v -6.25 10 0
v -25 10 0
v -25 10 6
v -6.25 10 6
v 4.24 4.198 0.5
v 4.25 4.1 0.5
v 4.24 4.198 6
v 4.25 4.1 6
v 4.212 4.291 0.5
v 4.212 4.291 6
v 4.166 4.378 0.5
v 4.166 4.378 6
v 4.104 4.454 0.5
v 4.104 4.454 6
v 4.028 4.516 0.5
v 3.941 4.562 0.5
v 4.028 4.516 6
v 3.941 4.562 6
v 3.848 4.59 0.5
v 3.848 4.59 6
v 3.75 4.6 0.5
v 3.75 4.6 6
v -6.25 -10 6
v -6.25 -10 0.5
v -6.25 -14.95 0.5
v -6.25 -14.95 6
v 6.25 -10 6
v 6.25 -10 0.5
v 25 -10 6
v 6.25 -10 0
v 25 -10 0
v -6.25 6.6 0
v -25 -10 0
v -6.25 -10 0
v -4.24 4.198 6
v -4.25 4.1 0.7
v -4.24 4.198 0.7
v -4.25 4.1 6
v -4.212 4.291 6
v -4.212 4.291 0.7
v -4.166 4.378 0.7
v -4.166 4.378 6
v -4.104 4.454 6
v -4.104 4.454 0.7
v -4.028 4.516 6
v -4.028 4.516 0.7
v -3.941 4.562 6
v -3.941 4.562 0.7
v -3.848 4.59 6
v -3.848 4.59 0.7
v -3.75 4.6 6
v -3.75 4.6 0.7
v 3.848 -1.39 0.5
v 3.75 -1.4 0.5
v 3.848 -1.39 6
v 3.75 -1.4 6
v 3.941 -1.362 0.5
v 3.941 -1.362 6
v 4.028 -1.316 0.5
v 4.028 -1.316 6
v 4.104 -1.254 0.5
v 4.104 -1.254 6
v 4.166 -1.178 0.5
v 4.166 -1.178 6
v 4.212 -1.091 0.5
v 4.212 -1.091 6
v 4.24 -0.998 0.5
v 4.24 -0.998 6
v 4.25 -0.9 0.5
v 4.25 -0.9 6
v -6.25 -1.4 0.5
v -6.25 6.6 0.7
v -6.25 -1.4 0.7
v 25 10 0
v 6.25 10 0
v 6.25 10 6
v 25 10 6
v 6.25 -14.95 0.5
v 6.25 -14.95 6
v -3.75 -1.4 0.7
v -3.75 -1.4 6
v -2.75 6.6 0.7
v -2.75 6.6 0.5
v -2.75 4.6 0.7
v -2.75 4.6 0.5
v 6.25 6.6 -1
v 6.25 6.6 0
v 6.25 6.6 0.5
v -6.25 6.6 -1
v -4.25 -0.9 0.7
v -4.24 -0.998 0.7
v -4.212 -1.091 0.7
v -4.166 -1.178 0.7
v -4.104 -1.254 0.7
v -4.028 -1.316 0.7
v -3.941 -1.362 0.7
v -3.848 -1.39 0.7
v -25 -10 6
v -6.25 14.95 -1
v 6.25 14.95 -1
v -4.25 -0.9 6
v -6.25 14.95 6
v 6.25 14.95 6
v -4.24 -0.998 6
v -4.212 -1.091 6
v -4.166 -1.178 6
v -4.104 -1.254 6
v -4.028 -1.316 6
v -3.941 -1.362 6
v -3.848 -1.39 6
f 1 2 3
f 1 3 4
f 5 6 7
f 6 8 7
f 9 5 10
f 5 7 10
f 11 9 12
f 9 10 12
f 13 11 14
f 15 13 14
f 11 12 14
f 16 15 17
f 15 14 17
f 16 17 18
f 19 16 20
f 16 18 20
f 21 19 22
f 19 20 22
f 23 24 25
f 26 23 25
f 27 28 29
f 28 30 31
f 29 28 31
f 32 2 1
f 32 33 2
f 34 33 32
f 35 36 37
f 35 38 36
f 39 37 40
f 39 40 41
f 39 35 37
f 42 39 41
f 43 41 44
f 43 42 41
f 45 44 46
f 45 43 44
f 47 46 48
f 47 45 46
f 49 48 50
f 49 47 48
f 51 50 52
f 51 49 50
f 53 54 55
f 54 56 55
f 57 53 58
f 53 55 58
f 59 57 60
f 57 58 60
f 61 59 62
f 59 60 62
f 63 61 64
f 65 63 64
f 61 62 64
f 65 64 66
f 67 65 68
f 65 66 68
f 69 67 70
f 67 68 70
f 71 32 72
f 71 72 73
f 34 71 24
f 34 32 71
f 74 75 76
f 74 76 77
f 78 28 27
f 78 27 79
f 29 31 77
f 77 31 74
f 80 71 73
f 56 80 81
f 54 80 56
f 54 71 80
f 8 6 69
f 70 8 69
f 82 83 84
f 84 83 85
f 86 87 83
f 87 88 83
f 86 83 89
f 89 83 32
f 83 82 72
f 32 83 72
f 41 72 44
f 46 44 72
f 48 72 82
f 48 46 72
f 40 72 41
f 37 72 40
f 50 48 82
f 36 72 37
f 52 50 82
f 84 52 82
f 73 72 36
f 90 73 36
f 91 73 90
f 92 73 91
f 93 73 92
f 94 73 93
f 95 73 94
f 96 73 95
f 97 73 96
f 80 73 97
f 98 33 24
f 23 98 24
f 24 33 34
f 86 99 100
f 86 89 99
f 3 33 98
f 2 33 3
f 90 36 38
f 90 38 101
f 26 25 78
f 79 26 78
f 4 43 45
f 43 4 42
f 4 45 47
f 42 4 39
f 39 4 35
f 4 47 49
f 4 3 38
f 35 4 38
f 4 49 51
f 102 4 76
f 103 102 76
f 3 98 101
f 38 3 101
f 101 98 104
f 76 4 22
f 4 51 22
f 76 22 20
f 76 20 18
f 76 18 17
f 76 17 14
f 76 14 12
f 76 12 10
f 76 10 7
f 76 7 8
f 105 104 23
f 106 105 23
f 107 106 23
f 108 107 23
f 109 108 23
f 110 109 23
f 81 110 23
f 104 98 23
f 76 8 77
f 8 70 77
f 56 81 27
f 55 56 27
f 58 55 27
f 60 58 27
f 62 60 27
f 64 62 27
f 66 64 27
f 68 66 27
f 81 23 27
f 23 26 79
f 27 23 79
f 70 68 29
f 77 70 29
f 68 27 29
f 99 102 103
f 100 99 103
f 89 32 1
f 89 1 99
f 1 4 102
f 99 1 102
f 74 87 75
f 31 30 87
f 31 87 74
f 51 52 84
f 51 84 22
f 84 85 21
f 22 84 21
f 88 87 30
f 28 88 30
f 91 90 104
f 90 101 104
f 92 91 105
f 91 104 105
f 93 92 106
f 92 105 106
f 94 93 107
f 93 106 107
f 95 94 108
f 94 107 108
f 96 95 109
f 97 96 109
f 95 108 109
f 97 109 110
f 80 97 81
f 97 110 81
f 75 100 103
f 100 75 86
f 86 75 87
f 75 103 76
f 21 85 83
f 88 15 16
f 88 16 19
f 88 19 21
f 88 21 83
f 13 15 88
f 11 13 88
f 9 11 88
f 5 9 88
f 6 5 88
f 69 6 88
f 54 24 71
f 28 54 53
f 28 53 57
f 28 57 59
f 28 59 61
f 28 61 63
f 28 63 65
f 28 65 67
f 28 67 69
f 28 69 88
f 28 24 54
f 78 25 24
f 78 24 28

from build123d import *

# Parameters (mm, degrees)
F0_W      = 50
F0_H      = 20
F1_DEPTH  = 6
F2_W      = 12.5
F2_H      = 29.9
F3_DEPTH  = 6
F5_W      = 12.5
F5_H      = 21.55
F6_DEPTH  = 0.5
F8_W      = 3.5
F8_H      = 8
F9_DEPTH  = 0.2
F11_DEPTH = 1
F12_W     = 8.5
F12_H     = 6
F13_DEPTH = 25
F14_R     = 0.5


with BuildPart() as f1:
    # F0 (on Top) → F1 (new body)
    with BuildSketch(Plane.XY):
        Rectangle(F0_W, F0_H)
    extrude(amount=F1_DEPTH)

    # F2 (on face) → F3 (join)
    with BuildSketch(Plane(origin=(0, 0, 0), x_dir=(1, 0, 0), z_dir=(0, 0, -1))):
        Rectangle(F2_W, F2_H)
    extrude(amount=-F3_DEPTH)

    # F5 (on face) → F6 (cut)
    with BuildSketch(Plane(origin=(0, 0, 0), x_dir=(1, 0, 0), z_dir=(0, 0, -1))):
        with Locations((0, 4.175)):
            Rectangle(F5_W, F5_H)
    extrude(amount=-F6_DEPTH, mode=Mode.SUBTRACT)

    # F8 (on face) → F9 (cut)
    with BuildSketch(Plane(origin=(0, 0, 0.5), x_dir=(1, 0, 0), z_dir=(0, 0, -1))):
        with Locations((-4.5, -2.6)):
            Rectangle(F8_W, F8_H)
    extrude(amount=-F9_DEPTH, mode=Mode.SUBTRACT)

    # F10 (on face) → F11 (join)
    with BuildSketch(Plane(origin=(0, 0, 0), x_dir=(1, 0, 0), z_dir=(0, 0, -1))):
        Polygon((-6.25, -10), (-6.25, -14.95), (6.25, -14.95), (6.25, -6.6), (-6.25, -6.6), align=None)
    extrude(amount=F11_DEPTH)

    # F12 (on face) → F13 (cut)
    with BuildSketch(Plane(origin=(0, 0, 0.5), x_dir=(1, 0, 0), z_dir=(0, 0, -1))):
        with Locations((0, -1.6)):
            Rectangle(F12_W, F12_H)
    extrude(amount=-F13_DEPTH, mode=Mode.SUBTRACT)

    # F14
    f14_edges = [f1.edges().sort_by_distance(p)[0] for p in [
        (4.25, -1.4, 3.25),
        (4.25, 4.6, 3.25),
        (-4.25, 4.6, 3.35),
        (-4.25, -1.4, 3.35),
    ]]
    fillet(f14_edges, radius=F14_R)


solid = f1.part
